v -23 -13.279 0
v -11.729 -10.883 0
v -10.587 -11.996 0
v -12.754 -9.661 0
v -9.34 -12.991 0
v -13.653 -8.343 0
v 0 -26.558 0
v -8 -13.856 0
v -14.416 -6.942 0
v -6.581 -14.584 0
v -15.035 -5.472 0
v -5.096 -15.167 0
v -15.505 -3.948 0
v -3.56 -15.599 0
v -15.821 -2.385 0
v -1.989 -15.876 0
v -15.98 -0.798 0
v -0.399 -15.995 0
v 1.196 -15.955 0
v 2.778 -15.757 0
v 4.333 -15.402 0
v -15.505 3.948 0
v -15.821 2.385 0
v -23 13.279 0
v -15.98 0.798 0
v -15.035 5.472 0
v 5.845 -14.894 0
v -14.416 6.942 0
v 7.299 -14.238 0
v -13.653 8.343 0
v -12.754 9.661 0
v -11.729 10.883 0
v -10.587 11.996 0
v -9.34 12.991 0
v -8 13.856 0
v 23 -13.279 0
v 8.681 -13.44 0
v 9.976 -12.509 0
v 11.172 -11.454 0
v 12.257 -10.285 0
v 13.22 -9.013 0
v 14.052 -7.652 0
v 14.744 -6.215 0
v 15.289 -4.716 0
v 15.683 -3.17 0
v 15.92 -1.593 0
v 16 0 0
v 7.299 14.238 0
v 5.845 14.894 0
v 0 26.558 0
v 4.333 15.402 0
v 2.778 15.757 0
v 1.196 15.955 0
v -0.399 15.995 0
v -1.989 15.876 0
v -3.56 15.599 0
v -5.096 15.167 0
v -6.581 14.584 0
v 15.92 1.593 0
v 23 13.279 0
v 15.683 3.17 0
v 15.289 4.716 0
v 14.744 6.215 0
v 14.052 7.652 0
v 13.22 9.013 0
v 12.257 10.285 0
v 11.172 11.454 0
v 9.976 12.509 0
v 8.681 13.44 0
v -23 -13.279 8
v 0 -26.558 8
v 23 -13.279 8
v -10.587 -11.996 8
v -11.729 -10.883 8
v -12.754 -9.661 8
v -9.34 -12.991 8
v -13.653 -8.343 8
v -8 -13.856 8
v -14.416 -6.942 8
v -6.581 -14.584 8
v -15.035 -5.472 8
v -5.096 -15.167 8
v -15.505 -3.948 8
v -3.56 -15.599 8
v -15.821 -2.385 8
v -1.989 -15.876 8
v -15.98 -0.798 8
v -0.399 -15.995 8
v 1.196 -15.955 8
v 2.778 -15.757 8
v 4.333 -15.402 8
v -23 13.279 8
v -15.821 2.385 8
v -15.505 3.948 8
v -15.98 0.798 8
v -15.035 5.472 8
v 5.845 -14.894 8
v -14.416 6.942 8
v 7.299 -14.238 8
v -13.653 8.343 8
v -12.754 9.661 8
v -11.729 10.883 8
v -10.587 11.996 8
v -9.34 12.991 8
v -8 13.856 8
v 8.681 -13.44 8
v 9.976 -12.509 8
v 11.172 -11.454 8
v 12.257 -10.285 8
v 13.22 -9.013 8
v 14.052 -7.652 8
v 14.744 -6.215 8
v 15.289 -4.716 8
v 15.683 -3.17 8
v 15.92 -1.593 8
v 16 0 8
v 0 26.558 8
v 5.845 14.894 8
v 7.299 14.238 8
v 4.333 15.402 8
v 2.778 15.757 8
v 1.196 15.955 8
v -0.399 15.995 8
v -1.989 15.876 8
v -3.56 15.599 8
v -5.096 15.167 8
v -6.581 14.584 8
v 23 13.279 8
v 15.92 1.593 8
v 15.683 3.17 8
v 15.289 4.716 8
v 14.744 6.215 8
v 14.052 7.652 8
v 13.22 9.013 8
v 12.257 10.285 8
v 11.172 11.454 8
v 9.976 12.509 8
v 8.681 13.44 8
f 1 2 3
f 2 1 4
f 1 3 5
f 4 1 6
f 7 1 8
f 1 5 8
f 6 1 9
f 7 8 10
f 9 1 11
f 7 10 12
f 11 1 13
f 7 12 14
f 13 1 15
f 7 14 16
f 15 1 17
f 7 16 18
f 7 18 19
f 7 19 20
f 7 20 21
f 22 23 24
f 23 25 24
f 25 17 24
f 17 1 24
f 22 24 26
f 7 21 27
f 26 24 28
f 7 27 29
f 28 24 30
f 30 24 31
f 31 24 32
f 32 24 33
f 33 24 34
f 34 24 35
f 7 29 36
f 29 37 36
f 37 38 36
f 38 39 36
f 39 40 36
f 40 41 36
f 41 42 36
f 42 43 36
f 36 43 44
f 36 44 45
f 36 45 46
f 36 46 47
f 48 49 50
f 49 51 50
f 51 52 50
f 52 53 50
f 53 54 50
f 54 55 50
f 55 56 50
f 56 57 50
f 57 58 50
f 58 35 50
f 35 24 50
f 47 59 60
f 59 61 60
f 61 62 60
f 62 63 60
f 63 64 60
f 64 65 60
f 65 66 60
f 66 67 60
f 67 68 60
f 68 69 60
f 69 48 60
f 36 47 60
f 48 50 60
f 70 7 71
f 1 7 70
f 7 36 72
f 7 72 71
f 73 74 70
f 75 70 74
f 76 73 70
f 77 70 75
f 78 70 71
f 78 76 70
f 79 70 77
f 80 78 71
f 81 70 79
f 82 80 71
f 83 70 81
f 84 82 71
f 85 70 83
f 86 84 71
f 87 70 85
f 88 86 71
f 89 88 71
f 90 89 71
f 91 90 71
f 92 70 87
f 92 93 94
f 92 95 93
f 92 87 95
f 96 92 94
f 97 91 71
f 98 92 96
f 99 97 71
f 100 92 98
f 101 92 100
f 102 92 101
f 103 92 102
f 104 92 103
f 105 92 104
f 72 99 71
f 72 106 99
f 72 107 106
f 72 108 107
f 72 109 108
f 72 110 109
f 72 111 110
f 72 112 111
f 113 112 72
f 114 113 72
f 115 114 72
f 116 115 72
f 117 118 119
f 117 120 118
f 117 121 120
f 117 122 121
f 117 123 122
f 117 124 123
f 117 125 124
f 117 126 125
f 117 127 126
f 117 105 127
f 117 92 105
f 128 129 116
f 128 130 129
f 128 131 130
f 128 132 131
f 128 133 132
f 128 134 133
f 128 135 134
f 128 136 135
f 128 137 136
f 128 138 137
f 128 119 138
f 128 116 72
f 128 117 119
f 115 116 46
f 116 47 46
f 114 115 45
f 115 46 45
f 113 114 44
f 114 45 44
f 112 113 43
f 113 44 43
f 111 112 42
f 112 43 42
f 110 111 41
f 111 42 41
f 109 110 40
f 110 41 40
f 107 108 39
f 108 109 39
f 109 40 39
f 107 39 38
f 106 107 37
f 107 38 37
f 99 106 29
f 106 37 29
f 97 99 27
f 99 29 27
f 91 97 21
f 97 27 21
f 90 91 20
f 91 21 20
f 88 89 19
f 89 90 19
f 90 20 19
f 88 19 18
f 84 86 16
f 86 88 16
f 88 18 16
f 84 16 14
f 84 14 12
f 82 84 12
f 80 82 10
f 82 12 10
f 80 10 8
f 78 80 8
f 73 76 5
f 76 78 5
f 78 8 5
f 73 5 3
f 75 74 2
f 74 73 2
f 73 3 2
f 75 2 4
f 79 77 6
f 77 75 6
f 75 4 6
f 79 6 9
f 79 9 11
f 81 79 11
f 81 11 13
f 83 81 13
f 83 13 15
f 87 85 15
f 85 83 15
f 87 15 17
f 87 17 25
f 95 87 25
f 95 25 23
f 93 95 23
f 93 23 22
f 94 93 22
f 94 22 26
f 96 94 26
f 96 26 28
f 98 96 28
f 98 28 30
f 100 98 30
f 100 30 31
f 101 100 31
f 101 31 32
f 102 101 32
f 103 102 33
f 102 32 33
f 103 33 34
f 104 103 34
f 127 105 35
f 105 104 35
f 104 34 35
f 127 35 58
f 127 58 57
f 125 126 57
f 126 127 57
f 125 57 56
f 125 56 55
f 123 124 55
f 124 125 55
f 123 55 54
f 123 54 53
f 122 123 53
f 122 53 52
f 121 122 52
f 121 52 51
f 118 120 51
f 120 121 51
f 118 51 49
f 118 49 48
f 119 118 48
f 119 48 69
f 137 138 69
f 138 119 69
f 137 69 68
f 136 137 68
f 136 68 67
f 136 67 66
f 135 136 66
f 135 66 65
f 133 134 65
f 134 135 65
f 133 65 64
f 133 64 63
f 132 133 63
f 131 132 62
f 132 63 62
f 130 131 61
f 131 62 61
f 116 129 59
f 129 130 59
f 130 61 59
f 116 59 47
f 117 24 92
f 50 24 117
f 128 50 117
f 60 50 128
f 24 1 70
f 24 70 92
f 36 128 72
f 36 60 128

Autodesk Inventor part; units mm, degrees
ref_plane "YZ Plane" through (0, 0, 0) normal (1, 0, 0) x (0, 1, 0)
ref_plane "XZ Plane" through (0, 0, 0) normal (0, 1, 0) x (-1, 0, 0)
ref_plane "XY Plane" through (0, 0, 0) normal (0, 0, 1) x (1, 0, 0)
sketch "Эскиз1" plane through (0, 0, 0) normal (0, 0, 1) x (1, 0, 0)
  line L0 (0, -26.5581) -> (-23, -13.2791)
  line L1 (-23, -13.2791) -> (-23, 13.2791)
  line L2 (-23, 13.2791) -> (0, 26.5581)
  line L3 (0, 26.5581) -> (23, 13.2791)
  line L4 (23, 13.2791) -> (23, -13.2791)
  line L5 (23, -13.2791) -> (0, -26.5581)
  circle A0 centre (0, 0) radius 16
  dimension "d1" = 32
  dimension "d8" = 46
extrude "Выдавливание1" add sketch "Эскиз1" along normal blind 8
thread "Резьба1" size "M32x2" class "6H" standard "ANSI Metric M Profile" length 60
